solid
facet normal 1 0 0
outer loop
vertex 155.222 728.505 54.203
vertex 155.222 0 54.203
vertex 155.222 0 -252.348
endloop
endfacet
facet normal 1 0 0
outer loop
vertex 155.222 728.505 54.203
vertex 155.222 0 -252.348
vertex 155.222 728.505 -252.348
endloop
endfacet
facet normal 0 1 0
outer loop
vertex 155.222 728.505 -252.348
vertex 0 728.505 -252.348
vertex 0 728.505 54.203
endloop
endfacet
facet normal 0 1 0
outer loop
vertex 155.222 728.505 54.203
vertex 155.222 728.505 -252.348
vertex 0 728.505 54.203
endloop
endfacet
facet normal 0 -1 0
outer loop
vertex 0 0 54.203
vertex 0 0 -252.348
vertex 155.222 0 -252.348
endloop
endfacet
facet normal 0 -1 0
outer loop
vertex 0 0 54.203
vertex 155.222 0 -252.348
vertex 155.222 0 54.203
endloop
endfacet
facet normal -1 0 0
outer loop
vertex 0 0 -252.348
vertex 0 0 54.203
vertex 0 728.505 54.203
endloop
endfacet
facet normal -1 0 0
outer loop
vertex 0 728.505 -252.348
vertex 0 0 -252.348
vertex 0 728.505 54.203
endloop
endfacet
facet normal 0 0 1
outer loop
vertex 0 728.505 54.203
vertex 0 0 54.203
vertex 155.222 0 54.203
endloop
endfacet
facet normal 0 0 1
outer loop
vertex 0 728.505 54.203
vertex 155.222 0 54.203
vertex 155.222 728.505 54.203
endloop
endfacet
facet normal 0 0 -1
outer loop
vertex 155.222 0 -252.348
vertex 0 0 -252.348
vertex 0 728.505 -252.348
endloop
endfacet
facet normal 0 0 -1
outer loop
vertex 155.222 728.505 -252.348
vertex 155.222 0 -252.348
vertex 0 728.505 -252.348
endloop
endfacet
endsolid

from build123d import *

# Parameters (mm, degrees)
F0_W      = 728.5054326057
F0_H      = 306.5502718091
F1_DEPTH  = 155.222194
F2_R      = 50.8
F3_DEPTH  = 7.62
F1_FACE_W = 728.5054326057
F1_FACE_H = 306.5502718091
F4_DEPTH  = 1191


# Not quite as in the source:
# - an extrude ends at something that could not be found from the text; its depth is read off the source's solid
# - a feature names something its author has since deleted; it is built from what else it names


with BuildPart() as f1:
    # F0 (on Right) → F1 (new body)
    with BuildSketch(Plane.YZ):
        with Locations((364.2527163029, -99.0724824369)):
            Rectangle(F0_W, F0_H)
    extrude(amount=F1_DEPTH)

    # F2 (on face) → F3 (join)
    with BuildSketch(Plane(origin=(0, 0, 0), x_dir=(0, -1, 0), z_dir=(-1, 0, 0))):
        with Locations((-335.2750743124, -123.5973465323)):
            Circle(F2_R)
    extrude(amount=-F3_DEPTH)

    # F2 (on face) + F1_face (on face) → F4 (cut, through all)
    with BuildSketch(Plane(origin=(0, 0, 0), x_dir=(0, -1, 0), z_dir=(-1, 0, 0))):
        with Locations((-335.2750743124, -123.5973465323)):
            Circle(F2_R)
    with BuildSketch(Plane(origin=(0, 364.2527163029, -99.0724824369), x_dir=(0, 1, 0), z_dir=(-1, 0, 0))):
        Rectangle(F1_FACE_W, F1_FACE_H)
    extrude(amount=F4_DEPTH, mode=Mode.SUBTRACT)


solid = f1.part
